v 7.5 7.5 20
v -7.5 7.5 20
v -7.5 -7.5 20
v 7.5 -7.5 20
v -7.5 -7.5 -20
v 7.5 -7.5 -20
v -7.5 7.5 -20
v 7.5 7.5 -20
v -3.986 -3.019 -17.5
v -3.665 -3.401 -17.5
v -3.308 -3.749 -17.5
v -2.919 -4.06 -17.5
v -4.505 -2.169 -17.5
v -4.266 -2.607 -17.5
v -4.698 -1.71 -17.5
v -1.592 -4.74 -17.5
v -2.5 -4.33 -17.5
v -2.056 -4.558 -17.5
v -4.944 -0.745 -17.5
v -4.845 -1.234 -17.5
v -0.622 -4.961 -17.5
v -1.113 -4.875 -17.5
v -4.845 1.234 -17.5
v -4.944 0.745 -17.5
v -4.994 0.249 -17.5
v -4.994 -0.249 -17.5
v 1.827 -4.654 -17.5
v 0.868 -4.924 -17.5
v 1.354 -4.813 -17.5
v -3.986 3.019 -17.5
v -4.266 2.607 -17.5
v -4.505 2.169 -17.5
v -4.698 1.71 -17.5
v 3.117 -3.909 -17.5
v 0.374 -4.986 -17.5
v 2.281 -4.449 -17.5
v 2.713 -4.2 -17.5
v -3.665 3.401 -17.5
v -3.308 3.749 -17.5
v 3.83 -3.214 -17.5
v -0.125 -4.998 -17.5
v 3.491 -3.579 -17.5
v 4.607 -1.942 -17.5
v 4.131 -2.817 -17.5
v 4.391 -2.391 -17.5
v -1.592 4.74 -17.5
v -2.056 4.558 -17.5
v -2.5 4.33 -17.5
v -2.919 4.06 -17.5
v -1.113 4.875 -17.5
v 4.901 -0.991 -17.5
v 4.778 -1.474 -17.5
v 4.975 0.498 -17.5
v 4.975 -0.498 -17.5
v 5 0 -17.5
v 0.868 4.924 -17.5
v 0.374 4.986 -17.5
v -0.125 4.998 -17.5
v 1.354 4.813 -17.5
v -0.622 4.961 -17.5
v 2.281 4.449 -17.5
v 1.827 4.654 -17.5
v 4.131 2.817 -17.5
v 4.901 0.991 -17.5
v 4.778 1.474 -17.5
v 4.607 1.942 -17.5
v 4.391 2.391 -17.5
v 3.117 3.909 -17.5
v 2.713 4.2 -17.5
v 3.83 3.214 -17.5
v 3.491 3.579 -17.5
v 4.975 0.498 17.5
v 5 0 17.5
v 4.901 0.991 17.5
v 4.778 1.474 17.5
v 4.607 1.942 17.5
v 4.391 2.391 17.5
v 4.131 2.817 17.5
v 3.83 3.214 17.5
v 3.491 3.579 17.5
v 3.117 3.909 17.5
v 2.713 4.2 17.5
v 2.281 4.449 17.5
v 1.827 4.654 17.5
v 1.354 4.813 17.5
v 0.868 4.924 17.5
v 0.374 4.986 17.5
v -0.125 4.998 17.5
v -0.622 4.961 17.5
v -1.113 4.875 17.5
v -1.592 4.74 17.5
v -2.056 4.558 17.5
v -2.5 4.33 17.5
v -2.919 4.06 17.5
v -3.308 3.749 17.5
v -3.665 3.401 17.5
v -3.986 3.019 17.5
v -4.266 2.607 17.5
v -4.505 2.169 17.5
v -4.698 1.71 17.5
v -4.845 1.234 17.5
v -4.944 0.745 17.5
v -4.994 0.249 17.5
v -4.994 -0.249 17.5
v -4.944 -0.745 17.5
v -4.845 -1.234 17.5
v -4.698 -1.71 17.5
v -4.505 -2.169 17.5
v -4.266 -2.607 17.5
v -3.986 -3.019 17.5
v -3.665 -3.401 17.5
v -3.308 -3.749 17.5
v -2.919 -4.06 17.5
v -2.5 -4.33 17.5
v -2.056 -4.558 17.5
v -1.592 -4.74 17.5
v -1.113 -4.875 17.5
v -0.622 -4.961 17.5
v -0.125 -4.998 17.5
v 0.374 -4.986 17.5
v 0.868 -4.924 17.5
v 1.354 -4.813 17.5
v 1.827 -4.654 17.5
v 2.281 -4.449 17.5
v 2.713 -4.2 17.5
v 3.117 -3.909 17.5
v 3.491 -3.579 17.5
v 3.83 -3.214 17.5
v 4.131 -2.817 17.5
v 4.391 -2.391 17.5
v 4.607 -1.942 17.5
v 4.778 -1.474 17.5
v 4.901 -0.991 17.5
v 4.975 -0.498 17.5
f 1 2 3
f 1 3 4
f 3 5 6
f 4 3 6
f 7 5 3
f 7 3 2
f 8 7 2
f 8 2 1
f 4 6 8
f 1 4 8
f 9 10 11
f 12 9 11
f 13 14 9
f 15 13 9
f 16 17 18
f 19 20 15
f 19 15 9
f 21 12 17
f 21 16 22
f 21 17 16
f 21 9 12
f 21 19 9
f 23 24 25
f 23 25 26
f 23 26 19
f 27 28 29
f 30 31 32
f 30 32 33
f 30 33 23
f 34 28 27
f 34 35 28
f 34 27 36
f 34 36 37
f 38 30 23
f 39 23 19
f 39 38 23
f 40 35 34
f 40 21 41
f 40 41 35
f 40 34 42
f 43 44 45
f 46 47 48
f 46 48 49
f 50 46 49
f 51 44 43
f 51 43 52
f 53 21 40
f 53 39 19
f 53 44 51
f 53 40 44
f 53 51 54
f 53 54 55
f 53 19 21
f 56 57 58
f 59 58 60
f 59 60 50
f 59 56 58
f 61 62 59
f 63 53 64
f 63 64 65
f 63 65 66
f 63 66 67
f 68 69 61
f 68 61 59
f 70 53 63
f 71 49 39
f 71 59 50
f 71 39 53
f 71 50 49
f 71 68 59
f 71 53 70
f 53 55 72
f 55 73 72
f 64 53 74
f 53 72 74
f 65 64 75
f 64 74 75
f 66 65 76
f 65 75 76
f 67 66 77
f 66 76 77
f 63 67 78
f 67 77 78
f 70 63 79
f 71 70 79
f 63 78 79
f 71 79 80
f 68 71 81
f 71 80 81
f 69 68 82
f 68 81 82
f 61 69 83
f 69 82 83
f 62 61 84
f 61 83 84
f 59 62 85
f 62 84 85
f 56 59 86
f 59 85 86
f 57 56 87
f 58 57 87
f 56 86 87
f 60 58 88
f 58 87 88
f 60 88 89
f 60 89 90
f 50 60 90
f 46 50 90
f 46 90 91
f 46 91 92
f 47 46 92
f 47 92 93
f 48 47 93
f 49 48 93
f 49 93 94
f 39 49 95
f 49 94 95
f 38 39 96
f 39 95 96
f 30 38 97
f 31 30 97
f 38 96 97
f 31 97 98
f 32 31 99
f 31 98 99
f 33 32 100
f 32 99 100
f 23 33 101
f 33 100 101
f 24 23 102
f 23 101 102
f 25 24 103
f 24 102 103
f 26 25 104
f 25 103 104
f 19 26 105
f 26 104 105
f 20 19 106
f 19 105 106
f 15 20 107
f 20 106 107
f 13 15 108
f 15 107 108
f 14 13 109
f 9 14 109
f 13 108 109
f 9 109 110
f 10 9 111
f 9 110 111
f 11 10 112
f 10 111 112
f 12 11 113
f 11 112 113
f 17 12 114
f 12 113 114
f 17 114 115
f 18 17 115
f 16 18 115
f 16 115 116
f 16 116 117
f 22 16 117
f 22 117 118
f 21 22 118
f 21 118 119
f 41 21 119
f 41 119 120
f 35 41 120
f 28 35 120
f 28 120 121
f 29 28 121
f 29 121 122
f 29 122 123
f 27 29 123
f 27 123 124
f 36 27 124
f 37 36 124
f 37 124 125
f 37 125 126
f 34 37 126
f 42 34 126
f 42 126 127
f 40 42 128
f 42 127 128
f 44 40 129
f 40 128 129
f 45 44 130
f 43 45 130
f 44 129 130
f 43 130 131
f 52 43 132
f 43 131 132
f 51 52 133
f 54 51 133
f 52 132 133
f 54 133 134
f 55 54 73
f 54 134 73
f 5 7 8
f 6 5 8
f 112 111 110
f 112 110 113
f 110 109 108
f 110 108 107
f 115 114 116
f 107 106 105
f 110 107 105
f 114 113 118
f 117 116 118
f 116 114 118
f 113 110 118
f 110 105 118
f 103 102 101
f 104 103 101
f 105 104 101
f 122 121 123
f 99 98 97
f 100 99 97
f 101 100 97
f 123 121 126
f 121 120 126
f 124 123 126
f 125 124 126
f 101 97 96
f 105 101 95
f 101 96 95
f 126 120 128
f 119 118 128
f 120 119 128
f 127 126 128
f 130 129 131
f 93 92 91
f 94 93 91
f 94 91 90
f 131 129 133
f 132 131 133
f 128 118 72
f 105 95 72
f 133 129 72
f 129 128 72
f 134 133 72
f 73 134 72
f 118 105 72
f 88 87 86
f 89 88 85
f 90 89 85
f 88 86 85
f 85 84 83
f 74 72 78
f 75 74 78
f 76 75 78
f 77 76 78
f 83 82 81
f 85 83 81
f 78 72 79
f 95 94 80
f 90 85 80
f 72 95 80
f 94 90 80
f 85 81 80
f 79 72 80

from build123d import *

# Parameters (mm, degrees)
SKETCH1_W           = 15
SKETCH1_H           = 15
BOSS_EXTRUDE1_DEPTH = 20
SKETCH2_R           = 5
CUT_EXTRUDE1_DEPTH  = 17.5


with BuildPart() as part:
    # Sketch1 → Boss-Extrude1 (new body, symmetric)
    with BuildSketch(Plane.XY):
        Rectangle(SKETCH1_W, SKETCH1_H)
    extrude(amount=BOSS_EXTRUDE1_DEPTH, both=True)

    # Sketch2 → Cut-Extrude1 (cut, symmetric)
    with BuildSketch(Plane.XY):
        Circle(SKETCH2_R)
    extrude(amount=CUT_EXTRUDE1_DEPTH, both=True, mode=Mode.SUBTRACT)


solid = part.part
